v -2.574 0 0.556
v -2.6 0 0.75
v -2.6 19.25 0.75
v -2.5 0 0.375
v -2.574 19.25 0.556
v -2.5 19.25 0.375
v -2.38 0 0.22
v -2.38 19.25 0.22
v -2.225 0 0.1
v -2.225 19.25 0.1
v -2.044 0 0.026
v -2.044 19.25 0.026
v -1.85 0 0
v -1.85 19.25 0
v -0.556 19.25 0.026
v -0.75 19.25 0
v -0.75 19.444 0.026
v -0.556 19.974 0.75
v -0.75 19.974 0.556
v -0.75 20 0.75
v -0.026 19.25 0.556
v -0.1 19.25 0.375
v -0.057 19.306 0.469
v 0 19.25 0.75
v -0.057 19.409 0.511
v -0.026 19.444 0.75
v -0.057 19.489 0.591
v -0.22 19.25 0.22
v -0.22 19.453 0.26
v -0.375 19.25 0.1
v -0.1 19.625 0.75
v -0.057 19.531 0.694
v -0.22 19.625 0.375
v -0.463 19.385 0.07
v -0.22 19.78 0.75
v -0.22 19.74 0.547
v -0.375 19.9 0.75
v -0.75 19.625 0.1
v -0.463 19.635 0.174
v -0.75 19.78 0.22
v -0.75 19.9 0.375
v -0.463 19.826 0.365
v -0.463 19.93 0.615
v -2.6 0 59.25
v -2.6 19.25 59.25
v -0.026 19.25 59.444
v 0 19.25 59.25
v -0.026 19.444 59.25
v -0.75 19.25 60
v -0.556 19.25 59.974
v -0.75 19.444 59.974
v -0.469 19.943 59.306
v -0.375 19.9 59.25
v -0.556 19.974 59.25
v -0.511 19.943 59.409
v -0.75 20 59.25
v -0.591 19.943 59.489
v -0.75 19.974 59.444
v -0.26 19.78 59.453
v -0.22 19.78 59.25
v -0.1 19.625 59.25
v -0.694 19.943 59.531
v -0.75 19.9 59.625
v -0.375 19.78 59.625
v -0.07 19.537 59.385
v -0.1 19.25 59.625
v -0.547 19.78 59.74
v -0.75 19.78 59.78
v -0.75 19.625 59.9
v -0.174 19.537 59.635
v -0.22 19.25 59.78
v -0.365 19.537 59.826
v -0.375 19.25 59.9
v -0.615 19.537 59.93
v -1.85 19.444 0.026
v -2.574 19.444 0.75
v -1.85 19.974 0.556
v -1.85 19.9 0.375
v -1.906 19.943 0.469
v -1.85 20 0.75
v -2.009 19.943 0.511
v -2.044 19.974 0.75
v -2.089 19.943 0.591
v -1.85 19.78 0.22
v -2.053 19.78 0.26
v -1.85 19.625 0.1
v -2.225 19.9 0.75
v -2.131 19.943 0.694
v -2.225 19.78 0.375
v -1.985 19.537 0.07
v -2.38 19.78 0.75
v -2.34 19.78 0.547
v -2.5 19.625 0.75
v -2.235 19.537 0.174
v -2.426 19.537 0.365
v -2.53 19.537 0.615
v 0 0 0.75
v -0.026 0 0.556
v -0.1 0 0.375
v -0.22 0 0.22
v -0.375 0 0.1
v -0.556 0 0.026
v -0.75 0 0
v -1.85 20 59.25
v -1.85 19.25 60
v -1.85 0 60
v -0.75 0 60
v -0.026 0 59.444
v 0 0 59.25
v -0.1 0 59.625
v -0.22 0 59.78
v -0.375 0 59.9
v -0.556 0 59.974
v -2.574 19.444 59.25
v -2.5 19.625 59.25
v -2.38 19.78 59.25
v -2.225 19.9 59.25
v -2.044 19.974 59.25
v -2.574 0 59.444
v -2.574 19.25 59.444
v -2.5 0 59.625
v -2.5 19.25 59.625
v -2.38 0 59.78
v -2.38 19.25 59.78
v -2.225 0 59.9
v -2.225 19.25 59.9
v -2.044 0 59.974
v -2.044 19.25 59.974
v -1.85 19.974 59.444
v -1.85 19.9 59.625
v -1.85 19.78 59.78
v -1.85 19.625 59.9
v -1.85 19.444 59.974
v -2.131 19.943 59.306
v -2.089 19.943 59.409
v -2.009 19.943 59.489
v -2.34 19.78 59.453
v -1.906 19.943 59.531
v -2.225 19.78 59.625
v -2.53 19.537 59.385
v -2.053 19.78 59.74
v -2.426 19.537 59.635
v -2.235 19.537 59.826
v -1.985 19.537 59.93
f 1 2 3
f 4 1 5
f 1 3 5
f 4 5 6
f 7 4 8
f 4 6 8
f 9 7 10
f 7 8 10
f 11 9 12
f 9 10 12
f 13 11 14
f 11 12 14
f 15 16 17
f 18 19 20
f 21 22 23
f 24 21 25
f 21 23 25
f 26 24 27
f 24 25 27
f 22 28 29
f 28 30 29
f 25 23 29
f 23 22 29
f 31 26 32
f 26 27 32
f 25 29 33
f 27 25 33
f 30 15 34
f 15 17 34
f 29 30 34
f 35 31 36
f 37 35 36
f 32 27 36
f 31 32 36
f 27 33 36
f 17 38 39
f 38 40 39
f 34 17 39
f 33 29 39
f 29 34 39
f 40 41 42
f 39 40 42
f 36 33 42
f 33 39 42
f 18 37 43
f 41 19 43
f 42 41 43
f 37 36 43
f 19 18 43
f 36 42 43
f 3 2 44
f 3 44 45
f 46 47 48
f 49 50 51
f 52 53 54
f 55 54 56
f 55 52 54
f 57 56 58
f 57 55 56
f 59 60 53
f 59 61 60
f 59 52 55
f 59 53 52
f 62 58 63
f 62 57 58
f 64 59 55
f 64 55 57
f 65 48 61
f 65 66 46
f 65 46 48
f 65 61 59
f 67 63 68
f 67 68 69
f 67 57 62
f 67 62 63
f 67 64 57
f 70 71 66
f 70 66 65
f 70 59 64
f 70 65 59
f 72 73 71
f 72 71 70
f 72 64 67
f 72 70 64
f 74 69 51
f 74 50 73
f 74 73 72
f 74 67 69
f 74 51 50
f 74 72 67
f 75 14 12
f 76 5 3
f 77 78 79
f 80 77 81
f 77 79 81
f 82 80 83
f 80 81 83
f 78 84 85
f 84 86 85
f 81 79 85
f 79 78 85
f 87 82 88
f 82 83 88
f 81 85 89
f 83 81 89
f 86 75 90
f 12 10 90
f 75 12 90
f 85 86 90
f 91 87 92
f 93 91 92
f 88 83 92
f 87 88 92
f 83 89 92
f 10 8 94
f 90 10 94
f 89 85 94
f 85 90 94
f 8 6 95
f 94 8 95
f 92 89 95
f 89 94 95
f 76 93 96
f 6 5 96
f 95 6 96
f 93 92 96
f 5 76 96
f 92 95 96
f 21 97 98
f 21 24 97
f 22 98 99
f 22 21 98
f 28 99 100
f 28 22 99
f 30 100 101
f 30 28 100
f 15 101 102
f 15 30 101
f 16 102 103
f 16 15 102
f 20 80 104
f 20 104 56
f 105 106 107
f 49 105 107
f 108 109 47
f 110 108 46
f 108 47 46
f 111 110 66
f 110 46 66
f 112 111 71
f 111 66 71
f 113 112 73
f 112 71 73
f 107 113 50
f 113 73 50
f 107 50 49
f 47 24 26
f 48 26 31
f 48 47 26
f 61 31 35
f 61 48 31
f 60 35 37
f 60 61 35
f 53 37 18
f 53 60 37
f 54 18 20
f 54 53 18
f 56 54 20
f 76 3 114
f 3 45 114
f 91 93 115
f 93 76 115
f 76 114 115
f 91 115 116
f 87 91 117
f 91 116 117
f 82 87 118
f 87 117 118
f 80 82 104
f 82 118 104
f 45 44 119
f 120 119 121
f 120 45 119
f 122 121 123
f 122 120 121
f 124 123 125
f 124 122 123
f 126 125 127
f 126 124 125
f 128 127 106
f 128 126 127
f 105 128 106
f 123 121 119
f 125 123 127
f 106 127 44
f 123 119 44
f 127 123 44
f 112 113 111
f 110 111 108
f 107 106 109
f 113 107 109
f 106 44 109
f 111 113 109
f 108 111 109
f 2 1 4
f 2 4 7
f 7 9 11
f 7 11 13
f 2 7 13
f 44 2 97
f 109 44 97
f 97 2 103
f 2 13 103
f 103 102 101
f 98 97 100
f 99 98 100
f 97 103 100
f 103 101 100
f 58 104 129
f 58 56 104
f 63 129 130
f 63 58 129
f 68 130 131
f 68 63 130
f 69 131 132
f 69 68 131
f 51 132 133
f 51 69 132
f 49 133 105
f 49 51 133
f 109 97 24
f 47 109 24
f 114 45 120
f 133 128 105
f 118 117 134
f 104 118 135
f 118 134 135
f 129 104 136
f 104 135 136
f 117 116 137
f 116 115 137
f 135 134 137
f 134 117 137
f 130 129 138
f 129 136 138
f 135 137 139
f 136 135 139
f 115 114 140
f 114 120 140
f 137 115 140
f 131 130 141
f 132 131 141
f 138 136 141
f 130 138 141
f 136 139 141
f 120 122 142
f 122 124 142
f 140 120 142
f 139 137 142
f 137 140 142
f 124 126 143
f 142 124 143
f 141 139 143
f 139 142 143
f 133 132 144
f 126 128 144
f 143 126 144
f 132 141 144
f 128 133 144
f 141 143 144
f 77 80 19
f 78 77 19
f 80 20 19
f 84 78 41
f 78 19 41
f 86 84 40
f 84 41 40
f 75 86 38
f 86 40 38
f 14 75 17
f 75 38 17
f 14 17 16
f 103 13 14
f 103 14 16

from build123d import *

# Parameters (mm, degrees)
SCHIZZO2_W                   = 2.6
SCHIZZO2_H                   = 20
ESTRUSIONE_ESTRUSIONE1_DEPTH = 60
RACCORDO1_R                  = 0.75


with BuildPart() as part:
    # Schizzo2 → Estrusione-Estrusione1 (new body)
    with BuildSketch(Plane.XY):
        with Locations((-1.3, 10)):
            Rectangle(SCHIZZO2_W, SCHIZZO2_H)
    extrude(amount=ESTRUSIONE_ESTRUSIONE1_DEPTH)

    # Raccordo1
    raccordo1_edges = [part.edges().sort_by_distance(p)[0] for p in [
        (-2.6, 10, 60),
        (0, 10, 60),
        (-2.6, 10, 0),
        (-1.3, 20, 0),
        (0, 10, 0),
        (-2.6, 20, 30),
        (0, 20, 30),
        (-1.3, 20, 60),
    ]]
    fillet(raccordo1_edges, radius=RACCORDO1_R)


solid = part.part
